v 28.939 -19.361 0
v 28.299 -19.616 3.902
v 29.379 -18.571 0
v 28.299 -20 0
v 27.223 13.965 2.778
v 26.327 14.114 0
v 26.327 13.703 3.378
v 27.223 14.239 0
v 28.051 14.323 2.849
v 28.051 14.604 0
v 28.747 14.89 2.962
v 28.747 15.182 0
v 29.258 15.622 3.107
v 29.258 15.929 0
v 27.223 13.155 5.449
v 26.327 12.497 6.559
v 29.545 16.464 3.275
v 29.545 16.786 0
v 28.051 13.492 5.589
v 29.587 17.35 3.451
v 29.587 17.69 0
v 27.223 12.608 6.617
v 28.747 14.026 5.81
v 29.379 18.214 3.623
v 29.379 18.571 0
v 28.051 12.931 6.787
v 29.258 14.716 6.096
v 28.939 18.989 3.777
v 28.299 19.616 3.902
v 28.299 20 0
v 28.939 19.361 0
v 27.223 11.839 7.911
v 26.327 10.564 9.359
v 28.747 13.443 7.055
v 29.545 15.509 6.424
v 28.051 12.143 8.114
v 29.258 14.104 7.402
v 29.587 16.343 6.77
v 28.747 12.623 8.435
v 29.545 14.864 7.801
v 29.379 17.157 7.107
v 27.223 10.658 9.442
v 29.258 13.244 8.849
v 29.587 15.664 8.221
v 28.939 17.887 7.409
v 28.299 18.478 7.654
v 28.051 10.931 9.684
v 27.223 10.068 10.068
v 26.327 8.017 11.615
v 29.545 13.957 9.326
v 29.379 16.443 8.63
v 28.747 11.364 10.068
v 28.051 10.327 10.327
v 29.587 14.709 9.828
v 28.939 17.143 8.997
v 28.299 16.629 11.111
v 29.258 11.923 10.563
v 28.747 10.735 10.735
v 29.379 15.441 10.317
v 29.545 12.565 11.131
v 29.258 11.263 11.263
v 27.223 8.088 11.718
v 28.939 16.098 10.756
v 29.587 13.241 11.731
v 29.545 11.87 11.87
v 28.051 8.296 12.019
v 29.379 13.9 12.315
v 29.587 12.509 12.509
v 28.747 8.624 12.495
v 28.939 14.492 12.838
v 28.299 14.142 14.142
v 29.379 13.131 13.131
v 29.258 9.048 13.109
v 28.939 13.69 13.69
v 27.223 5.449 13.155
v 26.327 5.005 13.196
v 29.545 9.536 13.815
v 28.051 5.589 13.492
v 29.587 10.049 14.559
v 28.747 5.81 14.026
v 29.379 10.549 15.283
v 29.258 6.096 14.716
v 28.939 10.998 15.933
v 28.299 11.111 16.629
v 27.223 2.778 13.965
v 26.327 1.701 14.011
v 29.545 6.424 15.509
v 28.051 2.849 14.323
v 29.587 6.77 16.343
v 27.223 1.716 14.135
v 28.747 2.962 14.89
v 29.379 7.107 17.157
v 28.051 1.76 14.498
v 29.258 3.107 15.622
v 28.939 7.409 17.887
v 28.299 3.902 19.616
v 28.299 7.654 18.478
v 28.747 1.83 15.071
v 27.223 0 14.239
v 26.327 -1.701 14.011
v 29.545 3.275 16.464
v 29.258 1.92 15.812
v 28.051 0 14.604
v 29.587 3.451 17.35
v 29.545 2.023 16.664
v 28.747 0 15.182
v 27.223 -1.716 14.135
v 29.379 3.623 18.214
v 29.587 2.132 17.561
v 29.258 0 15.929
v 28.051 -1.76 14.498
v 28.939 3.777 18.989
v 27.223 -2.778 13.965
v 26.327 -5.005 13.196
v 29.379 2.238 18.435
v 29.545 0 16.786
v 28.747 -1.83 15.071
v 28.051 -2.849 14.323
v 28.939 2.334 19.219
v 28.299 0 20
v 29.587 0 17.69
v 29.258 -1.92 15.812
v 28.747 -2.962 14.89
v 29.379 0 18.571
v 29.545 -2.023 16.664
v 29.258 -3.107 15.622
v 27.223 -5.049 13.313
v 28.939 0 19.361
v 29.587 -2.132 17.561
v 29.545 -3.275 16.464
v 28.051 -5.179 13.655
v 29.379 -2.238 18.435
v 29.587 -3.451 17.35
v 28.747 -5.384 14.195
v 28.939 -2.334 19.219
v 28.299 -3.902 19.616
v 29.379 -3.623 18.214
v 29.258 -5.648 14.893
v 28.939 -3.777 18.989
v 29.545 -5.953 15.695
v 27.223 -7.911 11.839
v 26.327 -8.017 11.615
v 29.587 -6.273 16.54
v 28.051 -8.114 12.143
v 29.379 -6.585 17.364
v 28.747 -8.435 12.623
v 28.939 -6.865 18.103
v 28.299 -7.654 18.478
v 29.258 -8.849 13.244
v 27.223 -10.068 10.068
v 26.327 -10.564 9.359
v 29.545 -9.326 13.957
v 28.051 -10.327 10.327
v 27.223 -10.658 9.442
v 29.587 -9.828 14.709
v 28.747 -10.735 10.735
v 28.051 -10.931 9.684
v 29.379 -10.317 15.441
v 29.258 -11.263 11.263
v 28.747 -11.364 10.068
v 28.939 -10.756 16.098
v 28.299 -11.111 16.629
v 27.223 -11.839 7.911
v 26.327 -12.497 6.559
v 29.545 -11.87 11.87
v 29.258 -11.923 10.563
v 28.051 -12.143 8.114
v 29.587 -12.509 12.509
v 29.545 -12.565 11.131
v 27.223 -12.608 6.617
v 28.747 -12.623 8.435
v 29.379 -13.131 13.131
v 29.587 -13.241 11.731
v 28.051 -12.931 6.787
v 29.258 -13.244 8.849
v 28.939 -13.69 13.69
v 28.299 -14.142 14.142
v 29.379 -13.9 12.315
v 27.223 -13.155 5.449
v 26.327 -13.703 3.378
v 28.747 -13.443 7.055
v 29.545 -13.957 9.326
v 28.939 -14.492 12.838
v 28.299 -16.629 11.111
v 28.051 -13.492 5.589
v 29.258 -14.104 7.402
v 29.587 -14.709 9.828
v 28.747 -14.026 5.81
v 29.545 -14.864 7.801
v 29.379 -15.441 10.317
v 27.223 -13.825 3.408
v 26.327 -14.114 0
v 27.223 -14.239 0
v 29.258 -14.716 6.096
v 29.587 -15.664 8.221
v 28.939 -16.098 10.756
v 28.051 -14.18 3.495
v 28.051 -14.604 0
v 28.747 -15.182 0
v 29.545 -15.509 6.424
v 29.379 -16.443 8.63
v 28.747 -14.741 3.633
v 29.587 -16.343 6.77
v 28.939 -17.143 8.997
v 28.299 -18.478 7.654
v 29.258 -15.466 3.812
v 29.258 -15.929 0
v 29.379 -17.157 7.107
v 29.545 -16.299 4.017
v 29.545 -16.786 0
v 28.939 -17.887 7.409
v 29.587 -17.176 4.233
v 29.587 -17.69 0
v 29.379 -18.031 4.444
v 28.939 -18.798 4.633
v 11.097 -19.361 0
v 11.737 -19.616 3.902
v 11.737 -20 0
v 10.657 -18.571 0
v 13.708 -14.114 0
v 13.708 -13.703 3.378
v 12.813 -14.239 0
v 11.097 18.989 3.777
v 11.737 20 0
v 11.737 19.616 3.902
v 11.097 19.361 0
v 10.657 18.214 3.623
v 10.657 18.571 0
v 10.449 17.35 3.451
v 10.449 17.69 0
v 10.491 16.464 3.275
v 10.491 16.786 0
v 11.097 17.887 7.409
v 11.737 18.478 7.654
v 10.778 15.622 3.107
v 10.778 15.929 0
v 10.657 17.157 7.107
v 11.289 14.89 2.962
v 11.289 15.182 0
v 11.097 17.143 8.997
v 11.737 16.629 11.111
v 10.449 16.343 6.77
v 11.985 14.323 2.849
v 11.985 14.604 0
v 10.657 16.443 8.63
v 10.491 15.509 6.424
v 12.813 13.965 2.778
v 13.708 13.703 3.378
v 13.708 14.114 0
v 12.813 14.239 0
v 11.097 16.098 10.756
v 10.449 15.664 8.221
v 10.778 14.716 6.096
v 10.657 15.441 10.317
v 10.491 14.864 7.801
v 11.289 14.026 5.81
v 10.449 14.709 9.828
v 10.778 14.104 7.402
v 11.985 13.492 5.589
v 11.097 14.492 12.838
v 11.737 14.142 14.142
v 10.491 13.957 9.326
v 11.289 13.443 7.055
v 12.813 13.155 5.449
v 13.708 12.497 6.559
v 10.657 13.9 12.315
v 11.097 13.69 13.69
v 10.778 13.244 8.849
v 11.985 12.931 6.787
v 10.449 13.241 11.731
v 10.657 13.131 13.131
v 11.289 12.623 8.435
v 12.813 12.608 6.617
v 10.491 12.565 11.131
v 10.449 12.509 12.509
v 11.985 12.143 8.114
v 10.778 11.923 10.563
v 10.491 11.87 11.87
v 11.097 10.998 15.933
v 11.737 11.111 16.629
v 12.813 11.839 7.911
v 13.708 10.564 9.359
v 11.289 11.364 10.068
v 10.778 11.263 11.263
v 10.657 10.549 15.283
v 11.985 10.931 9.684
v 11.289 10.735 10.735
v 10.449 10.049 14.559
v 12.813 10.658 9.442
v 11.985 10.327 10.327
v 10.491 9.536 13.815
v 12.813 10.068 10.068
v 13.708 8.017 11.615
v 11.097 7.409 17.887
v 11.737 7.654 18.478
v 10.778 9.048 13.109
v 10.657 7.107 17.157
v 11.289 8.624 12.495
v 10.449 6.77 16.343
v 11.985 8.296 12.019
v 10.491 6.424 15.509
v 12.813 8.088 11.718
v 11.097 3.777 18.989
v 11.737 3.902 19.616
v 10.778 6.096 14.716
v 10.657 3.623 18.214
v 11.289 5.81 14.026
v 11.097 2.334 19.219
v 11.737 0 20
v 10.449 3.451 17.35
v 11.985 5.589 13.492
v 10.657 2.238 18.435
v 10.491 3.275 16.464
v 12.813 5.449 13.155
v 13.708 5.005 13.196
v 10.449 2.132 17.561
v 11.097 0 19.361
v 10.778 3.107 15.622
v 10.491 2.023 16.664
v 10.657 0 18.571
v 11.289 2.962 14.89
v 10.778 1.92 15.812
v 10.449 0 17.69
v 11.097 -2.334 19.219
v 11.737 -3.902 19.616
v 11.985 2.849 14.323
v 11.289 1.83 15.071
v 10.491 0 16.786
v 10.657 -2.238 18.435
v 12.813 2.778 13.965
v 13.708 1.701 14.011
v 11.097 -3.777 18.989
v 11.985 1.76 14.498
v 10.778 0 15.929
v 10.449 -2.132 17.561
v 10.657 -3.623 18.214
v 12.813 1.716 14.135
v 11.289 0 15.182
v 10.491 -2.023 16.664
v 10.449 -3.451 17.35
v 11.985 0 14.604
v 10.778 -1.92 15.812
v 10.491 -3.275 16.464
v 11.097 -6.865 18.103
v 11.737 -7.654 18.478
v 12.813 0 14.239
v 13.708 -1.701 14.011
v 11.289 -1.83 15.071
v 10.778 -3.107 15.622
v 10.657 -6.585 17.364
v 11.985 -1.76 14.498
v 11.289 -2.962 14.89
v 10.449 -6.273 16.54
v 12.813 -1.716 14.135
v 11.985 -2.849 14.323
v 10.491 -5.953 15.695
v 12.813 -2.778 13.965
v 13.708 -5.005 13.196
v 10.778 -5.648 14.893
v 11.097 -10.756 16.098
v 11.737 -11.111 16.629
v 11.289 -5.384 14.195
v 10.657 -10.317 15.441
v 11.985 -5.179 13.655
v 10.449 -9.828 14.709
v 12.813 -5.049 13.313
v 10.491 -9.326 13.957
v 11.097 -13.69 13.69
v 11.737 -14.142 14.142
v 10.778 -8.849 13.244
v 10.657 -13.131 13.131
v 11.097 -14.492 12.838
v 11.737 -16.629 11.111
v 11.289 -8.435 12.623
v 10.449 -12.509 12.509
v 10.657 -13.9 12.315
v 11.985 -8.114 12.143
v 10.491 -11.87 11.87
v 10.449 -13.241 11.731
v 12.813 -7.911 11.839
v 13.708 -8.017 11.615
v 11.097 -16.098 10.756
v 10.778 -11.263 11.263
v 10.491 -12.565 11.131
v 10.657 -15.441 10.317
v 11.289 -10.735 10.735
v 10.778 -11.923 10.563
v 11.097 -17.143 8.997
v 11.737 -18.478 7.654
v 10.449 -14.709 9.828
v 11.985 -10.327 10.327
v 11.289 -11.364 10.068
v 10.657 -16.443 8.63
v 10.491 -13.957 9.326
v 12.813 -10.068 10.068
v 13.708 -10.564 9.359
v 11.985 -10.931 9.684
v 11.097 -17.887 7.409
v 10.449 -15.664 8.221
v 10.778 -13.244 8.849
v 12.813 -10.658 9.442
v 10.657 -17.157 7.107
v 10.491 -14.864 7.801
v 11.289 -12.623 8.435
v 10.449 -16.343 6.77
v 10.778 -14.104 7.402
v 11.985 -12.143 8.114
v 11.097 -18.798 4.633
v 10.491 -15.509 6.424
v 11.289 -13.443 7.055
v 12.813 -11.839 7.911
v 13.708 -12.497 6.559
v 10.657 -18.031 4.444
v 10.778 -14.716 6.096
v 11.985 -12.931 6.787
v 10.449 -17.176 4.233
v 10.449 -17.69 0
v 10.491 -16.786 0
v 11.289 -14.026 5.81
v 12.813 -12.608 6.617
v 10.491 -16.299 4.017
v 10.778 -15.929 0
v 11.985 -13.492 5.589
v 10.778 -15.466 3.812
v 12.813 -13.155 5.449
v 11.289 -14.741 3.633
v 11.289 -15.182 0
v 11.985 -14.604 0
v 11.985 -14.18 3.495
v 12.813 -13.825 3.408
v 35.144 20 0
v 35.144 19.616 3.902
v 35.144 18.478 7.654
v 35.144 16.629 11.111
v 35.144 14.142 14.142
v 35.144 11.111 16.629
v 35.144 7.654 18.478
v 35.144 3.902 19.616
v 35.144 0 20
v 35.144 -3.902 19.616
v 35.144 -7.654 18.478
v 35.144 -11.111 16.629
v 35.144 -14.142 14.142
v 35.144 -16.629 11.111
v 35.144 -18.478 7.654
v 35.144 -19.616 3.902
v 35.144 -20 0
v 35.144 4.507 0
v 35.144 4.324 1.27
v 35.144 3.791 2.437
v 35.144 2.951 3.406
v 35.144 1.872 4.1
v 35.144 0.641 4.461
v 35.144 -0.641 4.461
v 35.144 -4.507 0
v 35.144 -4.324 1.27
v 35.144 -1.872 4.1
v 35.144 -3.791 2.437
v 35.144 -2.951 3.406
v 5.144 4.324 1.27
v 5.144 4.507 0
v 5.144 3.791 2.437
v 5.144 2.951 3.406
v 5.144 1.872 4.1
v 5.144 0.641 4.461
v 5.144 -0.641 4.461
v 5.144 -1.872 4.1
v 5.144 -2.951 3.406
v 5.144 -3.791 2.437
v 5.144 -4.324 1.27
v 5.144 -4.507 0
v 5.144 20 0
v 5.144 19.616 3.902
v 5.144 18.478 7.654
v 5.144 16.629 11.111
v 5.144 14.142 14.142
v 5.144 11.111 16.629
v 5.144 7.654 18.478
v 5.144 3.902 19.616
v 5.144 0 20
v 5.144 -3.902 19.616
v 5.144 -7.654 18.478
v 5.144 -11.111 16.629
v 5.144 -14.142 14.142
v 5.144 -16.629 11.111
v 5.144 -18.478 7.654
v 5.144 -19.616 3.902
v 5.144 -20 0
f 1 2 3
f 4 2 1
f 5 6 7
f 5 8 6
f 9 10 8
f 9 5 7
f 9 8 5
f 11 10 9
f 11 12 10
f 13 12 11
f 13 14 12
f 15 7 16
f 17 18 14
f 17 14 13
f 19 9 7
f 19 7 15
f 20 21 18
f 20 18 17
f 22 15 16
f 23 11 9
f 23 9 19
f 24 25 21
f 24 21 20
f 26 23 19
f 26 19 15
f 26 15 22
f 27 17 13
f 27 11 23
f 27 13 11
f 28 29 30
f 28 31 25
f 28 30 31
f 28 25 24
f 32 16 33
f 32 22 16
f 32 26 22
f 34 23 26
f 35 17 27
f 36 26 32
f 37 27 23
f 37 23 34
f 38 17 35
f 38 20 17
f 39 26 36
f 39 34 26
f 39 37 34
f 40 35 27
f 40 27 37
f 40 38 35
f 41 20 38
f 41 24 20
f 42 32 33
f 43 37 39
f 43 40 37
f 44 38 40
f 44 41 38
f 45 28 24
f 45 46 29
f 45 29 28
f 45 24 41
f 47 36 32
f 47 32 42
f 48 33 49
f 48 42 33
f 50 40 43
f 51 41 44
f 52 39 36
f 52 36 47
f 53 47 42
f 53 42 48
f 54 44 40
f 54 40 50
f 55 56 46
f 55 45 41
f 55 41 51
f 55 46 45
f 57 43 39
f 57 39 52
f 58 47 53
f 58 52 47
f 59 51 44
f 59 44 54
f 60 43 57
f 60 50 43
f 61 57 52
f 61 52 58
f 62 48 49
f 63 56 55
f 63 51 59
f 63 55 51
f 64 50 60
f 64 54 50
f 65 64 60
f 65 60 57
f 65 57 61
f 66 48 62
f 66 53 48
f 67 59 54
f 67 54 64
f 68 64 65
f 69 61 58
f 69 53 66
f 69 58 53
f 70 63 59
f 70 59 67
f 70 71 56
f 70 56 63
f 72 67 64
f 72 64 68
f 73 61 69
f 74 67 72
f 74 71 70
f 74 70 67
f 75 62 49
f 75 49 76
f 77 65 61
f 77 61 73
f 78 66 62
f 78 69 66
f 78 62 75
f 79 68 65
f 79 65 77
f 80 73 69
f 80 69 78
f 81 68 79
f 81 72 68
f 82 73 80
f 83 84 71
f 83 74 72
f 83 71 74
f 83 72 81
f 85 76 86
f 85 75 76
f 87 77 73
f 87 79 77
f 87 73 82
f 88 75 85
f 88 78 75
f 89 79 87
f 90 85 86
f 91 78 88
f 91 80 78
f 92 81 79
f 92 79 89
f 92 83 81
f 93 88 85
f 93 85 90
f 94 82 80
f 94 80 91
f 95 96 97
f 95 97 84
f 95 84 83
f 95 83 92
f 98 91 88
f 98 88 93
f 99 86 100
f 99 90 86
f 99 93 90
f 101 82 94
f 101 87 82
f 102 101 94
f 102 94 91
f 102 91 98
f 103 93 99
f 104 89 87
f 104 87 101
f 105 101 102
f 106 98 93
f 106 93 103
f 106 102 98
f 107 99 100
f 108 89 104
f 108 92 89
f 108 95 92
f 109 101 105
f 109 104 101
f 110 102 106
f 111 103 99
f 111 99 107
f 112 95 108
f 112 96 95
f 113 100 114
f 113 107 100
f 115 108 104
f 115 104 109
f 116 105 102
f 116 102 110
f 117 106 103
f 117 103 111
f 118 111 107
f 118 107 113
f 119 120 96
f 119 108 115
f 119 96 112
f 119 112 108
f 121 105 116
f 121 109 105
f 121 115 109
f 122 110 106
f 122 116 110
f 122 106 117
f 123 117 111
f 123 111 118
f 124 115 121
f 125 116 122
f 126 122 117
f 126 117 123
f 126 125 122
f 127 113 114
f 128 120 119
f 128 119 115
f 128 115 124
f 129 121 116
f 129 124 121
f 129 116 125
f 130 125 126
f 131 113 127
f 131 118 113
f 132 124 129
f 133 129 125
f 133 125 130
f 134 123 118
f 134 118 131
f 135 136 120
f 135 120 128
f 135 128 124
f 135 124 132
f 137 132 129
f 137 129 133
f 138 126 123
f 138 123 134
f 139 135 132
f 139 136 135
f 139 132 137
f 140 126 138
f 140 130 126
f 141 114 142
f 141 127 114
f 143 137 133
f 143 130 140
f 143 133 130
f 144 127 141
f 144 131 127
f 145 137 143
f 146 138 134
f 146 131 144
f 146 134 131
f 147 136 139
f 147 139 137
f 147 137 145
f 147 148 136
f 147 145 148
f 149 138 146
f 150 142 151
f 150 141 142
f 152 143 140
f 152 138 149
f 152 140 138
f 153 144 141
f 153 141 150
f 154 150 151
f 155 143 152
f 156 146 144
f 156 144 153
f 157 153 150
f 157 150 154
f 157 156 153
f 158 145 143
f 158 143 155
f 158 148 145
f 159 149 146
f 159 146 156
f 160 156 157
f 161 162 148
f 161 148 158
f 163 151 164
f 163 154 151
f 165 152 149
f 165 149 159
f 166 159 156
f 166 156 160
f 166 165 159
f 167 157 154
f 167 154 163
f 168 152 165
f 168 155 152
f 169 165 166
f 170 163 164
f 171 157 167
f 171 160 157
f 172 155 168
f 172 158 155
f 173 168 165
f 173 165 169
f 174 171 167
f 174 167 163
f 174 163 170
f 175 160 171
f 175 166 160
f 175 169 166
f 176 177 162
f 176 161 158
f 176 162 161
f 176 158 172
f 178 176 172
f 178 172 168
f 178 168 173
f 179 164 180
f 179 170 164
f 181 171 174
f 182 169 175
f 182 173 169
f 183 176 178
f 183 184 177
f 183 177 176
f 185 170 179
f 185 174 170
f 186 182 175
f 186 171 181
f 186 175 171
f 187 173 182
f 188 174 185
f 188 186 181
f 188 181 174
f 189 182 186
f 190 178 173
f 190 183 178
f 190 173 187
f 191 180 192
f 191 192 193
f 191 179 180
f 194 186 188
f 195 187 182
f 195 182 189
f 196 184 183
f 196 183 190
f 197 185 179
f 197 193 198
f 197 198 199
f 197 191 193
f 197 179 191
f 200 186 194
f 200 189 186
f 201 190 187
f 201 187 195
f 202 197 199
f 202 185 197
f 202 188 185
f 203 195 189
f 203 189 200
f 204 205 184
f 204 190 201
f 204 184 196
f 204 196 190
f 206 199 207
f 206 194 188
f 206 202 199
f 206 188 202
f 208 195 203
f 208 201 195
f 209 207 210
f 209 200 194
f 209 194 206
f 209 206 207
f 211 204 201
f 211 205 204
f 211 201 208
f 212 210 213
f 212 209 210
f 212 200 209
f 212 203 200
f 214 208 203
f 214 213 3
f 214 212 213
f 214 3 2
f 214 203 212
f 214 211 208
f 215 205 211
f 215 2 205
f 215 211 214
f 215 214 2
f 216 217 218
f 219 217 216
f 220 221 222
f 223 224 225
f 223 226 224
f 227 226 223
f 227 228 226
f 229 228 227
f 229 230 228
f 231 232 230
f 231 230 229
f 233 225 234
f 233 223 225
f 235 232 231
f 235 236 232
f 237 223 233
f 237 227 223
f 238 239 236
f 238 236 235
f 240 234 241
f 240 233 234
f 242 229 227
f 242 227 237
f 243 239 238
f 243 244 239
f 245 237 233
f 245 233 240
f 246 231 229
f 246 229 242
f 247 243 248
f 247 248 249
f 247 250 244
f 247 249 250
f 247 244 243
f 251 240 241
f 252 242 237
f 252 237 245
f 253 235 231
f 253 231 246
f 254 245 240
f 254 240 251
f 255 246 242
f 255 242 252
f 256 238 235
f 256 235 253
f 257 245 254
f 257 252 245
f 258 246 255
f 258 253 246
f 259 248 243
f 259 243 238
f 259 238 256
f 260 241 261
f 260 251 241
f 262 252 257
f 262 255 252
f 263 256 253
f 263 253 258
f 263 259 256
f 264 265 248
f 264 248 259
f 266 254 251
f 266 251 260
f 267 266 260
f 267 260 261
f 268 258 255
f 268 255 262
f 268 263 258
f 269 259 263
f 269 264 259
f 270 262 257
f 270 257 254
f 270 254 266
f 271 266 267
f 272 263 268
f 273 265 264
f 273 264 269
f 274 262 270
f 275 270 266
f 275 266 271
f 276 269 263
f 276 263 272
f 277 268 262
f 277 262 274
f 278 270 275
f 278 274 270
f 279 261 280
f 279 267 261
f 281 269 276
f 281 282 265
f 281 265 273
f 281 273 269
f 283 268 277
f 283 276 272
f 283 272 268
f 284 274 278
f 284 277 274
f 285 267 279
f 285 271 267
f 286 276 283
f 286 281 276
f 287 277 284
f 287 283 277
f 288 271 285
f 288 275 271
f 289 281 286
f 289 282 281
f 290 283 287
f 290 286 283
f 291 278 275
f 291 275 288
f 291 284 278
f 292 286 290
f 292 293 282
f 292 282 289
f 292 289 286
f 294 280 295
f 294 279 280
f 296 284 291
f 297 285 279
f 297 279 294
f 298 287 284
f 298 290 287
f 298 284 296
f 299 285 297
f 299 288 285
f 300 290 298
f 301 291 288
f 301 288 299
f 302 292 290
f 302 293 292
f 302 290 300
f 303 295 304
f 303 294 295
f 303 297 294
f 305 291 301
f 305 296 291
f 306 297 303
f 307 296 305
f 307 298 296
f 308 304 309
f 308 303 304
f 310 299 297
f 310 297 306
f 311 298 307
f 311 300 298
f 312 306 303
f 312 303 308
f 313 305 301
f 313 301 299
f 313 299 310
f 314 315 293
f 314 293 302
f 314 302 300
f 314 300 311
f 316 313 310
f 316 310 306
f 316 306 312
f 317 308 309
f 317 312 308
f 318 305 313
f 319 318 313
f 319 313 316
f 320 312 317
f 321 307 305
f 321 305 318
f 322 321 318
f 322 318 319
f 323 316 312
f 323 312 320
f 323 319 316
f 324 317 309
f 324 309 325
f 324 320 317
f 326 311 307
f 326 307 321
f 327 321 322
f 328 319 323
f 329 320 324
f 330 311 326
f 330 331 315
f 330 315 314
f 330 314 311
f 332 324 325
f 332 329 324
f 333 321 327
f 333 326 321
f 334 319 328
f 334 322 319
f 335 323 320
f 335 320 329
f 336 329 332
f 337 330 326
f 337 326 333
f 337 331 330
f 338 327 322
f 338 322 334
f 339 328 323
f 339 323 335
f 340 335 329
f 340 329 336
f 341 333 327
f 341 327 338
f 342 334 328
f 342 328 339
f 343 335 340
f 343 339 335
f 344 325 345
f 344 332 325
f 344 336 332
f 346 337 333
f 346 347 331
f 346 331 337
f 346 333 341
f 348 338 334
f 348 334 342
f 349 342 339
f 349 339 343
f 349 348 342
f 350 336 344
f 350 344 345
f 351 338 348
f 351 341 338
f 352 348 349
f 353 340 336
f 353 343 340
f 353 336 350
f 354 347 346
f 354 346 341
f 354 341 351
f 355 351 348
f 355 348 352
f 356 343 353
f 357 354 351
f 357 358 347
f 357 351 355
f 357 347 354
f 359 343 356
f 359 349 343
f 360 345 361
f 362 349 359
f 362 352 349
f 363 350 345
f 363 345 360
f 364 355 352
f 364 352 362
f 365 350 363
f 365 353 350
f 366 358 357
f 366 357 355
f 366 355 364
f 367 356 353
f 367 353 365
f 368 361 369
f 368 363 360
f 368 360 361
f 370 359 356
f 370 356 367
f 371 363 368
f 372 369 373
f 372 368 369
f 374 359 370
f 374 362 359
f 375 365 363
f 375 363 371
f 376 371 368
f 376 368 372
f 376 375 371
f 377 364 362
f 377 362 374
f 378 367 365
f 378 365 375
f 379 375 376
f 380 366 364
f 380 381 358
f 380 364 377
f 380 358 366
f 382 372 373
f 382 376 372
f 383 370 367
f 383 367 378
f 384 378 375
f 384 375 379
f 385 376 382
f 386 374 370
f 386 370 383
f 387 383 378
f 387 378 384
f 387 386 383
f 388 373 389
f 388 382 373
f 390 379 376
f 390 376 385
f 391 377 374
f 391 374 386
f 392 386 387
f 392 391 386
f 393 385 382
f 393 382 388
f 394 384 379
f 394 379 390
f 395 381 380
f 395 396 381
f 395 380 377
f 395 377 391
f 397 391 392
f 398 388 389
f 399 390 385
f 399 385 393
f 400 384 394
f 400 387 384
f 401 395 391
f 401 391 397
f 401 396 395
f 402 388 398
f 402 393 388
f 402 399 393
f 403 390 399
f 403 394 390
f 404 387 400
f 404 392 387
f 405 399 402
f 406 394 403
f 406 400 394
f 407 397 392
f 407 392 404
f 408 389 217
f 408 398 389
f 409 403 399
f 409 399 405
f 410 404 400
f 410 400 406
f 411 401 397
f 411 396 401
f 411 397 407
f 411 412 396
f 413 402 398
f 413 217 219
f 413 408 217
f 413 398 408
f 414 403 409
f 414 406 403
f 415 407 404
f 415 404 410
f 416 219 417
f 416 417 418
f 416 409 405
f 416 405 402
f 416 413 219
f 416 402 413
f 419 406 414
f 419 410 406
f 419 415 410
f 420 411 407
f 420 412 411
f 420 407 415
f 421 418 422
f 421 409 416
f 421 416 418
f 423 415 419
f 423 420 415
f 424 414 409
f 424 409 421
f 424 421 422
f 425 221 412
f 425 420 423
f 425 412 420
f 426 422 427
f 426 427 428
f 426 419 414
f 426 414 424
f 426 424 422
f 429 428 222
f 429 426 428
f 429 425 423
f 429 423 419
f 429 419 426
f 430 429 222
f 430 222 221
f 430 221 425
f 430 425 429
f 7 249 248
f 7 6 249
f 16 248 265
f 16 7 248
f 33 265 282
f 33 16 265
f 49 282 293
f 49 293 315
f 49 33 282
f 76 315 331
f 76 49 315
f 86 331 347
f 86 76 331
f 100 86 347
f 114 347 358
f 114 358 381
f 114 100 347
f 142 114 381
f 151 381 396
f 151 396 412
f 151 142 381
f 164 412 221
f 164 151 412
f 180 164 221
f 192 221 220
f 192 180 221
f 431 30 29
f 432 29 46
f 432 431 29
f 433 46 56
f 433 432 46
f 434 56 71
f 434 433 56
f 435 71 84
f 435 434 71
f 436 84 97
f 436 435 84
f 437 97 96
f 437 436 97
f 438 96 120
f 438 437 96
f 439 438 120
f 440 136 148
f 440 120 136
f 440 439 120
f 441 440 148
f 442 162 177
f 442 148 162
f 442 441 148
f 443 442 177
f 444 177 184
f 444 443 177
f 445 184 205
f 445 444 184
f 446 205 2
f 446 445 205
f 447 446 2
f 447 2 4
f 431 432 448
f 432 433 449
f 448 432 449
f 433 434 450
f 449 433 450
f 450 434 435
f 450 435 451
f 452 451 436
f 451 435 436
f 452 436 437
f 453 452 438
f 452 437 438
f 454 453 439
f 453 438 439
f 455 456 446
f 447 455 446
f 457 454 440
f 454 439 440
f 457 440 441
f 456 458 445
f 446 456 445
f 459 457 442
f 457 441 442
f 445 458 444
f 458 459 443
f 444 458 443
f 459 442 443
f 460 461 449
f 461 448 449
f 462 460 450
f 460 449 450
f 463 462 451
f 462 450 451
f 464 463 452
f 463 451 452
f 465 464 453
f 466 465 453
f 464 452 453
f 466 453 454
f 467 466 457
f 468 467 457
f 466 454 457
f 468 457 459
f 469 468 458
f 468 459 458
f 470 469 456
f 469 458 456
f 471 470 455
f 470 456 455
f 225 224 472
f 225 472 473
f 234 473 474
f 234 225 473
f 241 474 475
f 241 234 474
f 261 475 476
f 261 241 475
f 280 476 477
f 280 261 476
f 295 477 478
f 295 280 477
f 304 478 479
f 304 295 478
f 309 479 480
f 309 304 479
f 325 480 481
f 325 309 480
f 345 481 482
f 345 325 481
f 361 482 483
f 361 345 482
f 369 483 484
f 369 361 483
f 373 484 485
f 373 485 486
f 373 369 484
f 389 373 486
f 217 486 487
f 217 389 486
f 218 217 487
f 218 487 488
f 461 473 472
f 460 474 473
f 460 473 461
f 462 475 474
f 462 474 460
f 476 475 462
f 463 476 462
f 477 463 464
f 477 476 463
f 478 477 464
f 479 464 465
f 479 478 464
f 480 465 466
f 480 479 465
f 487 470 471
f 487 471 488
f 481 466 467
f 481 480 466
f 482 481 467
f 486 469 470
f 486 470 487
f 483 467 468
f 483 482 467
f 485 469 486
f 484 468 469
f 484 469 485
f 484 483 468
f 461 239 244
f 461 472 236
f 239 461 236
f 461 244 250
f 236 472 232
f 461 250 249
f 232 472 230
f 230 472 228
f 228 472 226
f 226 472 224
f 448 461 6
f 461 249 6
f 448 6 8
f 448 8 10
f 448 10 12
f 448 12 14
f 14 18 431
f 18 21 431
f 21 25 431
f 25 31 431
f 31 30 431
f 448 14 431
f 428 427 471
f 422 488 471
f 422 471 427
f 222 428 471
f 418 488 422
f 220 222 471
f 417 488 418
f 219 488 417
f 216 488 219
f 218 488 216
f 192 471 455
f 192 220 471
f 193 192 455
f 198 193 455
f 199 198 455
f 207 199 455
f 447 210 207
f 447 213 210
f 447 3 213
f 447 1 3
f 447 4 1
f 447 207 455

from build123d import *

# Parameters (mm, degrees)
SKETCH_W         = 30
SKETCH_H         = 15.493133
REVOLUTION_ANGLE = 180


with BuildPart() as part:
    # Sketch → Revolution (revolve)
    with BuildSketch(Plane.XY):
        with Locations((20.143988, 12.253433)):
            Rectangle(SKETCH_W, SKETCH_H)
    revolve(axis=Axis((0, 0, 0), (1, 0, 0)), revolution_arc=REVOLUTION_ANGLE)

    # Sketch001 (on Face5 of Revolution) → Groove (revolve, cut)
    with BuildSketch(Plane(origin=(0, 0, 0), x_dir=(1, 0, 0), z_dir=(0, 0, -1))):
        with BuildLine():
            ThreePointArc((13.708482, 20.66012), (10.435215, 17.386853), (13.708482, 14.113586))
            Line((13.708482, 14.113586), (26.327395, 14.113586))
            ThreePointArc((26.327395, 14.113586), (29.600662, 17.386853), (26.327395, 20.66012))
            Line((13.708482, 20.66012), (26.327395, 20.66012))
        make_face()
    revolve(axis=Axis((0, 0, 0), (1, 0, 0)), mode=Mode.SUBTRACT)


solid = part.part
